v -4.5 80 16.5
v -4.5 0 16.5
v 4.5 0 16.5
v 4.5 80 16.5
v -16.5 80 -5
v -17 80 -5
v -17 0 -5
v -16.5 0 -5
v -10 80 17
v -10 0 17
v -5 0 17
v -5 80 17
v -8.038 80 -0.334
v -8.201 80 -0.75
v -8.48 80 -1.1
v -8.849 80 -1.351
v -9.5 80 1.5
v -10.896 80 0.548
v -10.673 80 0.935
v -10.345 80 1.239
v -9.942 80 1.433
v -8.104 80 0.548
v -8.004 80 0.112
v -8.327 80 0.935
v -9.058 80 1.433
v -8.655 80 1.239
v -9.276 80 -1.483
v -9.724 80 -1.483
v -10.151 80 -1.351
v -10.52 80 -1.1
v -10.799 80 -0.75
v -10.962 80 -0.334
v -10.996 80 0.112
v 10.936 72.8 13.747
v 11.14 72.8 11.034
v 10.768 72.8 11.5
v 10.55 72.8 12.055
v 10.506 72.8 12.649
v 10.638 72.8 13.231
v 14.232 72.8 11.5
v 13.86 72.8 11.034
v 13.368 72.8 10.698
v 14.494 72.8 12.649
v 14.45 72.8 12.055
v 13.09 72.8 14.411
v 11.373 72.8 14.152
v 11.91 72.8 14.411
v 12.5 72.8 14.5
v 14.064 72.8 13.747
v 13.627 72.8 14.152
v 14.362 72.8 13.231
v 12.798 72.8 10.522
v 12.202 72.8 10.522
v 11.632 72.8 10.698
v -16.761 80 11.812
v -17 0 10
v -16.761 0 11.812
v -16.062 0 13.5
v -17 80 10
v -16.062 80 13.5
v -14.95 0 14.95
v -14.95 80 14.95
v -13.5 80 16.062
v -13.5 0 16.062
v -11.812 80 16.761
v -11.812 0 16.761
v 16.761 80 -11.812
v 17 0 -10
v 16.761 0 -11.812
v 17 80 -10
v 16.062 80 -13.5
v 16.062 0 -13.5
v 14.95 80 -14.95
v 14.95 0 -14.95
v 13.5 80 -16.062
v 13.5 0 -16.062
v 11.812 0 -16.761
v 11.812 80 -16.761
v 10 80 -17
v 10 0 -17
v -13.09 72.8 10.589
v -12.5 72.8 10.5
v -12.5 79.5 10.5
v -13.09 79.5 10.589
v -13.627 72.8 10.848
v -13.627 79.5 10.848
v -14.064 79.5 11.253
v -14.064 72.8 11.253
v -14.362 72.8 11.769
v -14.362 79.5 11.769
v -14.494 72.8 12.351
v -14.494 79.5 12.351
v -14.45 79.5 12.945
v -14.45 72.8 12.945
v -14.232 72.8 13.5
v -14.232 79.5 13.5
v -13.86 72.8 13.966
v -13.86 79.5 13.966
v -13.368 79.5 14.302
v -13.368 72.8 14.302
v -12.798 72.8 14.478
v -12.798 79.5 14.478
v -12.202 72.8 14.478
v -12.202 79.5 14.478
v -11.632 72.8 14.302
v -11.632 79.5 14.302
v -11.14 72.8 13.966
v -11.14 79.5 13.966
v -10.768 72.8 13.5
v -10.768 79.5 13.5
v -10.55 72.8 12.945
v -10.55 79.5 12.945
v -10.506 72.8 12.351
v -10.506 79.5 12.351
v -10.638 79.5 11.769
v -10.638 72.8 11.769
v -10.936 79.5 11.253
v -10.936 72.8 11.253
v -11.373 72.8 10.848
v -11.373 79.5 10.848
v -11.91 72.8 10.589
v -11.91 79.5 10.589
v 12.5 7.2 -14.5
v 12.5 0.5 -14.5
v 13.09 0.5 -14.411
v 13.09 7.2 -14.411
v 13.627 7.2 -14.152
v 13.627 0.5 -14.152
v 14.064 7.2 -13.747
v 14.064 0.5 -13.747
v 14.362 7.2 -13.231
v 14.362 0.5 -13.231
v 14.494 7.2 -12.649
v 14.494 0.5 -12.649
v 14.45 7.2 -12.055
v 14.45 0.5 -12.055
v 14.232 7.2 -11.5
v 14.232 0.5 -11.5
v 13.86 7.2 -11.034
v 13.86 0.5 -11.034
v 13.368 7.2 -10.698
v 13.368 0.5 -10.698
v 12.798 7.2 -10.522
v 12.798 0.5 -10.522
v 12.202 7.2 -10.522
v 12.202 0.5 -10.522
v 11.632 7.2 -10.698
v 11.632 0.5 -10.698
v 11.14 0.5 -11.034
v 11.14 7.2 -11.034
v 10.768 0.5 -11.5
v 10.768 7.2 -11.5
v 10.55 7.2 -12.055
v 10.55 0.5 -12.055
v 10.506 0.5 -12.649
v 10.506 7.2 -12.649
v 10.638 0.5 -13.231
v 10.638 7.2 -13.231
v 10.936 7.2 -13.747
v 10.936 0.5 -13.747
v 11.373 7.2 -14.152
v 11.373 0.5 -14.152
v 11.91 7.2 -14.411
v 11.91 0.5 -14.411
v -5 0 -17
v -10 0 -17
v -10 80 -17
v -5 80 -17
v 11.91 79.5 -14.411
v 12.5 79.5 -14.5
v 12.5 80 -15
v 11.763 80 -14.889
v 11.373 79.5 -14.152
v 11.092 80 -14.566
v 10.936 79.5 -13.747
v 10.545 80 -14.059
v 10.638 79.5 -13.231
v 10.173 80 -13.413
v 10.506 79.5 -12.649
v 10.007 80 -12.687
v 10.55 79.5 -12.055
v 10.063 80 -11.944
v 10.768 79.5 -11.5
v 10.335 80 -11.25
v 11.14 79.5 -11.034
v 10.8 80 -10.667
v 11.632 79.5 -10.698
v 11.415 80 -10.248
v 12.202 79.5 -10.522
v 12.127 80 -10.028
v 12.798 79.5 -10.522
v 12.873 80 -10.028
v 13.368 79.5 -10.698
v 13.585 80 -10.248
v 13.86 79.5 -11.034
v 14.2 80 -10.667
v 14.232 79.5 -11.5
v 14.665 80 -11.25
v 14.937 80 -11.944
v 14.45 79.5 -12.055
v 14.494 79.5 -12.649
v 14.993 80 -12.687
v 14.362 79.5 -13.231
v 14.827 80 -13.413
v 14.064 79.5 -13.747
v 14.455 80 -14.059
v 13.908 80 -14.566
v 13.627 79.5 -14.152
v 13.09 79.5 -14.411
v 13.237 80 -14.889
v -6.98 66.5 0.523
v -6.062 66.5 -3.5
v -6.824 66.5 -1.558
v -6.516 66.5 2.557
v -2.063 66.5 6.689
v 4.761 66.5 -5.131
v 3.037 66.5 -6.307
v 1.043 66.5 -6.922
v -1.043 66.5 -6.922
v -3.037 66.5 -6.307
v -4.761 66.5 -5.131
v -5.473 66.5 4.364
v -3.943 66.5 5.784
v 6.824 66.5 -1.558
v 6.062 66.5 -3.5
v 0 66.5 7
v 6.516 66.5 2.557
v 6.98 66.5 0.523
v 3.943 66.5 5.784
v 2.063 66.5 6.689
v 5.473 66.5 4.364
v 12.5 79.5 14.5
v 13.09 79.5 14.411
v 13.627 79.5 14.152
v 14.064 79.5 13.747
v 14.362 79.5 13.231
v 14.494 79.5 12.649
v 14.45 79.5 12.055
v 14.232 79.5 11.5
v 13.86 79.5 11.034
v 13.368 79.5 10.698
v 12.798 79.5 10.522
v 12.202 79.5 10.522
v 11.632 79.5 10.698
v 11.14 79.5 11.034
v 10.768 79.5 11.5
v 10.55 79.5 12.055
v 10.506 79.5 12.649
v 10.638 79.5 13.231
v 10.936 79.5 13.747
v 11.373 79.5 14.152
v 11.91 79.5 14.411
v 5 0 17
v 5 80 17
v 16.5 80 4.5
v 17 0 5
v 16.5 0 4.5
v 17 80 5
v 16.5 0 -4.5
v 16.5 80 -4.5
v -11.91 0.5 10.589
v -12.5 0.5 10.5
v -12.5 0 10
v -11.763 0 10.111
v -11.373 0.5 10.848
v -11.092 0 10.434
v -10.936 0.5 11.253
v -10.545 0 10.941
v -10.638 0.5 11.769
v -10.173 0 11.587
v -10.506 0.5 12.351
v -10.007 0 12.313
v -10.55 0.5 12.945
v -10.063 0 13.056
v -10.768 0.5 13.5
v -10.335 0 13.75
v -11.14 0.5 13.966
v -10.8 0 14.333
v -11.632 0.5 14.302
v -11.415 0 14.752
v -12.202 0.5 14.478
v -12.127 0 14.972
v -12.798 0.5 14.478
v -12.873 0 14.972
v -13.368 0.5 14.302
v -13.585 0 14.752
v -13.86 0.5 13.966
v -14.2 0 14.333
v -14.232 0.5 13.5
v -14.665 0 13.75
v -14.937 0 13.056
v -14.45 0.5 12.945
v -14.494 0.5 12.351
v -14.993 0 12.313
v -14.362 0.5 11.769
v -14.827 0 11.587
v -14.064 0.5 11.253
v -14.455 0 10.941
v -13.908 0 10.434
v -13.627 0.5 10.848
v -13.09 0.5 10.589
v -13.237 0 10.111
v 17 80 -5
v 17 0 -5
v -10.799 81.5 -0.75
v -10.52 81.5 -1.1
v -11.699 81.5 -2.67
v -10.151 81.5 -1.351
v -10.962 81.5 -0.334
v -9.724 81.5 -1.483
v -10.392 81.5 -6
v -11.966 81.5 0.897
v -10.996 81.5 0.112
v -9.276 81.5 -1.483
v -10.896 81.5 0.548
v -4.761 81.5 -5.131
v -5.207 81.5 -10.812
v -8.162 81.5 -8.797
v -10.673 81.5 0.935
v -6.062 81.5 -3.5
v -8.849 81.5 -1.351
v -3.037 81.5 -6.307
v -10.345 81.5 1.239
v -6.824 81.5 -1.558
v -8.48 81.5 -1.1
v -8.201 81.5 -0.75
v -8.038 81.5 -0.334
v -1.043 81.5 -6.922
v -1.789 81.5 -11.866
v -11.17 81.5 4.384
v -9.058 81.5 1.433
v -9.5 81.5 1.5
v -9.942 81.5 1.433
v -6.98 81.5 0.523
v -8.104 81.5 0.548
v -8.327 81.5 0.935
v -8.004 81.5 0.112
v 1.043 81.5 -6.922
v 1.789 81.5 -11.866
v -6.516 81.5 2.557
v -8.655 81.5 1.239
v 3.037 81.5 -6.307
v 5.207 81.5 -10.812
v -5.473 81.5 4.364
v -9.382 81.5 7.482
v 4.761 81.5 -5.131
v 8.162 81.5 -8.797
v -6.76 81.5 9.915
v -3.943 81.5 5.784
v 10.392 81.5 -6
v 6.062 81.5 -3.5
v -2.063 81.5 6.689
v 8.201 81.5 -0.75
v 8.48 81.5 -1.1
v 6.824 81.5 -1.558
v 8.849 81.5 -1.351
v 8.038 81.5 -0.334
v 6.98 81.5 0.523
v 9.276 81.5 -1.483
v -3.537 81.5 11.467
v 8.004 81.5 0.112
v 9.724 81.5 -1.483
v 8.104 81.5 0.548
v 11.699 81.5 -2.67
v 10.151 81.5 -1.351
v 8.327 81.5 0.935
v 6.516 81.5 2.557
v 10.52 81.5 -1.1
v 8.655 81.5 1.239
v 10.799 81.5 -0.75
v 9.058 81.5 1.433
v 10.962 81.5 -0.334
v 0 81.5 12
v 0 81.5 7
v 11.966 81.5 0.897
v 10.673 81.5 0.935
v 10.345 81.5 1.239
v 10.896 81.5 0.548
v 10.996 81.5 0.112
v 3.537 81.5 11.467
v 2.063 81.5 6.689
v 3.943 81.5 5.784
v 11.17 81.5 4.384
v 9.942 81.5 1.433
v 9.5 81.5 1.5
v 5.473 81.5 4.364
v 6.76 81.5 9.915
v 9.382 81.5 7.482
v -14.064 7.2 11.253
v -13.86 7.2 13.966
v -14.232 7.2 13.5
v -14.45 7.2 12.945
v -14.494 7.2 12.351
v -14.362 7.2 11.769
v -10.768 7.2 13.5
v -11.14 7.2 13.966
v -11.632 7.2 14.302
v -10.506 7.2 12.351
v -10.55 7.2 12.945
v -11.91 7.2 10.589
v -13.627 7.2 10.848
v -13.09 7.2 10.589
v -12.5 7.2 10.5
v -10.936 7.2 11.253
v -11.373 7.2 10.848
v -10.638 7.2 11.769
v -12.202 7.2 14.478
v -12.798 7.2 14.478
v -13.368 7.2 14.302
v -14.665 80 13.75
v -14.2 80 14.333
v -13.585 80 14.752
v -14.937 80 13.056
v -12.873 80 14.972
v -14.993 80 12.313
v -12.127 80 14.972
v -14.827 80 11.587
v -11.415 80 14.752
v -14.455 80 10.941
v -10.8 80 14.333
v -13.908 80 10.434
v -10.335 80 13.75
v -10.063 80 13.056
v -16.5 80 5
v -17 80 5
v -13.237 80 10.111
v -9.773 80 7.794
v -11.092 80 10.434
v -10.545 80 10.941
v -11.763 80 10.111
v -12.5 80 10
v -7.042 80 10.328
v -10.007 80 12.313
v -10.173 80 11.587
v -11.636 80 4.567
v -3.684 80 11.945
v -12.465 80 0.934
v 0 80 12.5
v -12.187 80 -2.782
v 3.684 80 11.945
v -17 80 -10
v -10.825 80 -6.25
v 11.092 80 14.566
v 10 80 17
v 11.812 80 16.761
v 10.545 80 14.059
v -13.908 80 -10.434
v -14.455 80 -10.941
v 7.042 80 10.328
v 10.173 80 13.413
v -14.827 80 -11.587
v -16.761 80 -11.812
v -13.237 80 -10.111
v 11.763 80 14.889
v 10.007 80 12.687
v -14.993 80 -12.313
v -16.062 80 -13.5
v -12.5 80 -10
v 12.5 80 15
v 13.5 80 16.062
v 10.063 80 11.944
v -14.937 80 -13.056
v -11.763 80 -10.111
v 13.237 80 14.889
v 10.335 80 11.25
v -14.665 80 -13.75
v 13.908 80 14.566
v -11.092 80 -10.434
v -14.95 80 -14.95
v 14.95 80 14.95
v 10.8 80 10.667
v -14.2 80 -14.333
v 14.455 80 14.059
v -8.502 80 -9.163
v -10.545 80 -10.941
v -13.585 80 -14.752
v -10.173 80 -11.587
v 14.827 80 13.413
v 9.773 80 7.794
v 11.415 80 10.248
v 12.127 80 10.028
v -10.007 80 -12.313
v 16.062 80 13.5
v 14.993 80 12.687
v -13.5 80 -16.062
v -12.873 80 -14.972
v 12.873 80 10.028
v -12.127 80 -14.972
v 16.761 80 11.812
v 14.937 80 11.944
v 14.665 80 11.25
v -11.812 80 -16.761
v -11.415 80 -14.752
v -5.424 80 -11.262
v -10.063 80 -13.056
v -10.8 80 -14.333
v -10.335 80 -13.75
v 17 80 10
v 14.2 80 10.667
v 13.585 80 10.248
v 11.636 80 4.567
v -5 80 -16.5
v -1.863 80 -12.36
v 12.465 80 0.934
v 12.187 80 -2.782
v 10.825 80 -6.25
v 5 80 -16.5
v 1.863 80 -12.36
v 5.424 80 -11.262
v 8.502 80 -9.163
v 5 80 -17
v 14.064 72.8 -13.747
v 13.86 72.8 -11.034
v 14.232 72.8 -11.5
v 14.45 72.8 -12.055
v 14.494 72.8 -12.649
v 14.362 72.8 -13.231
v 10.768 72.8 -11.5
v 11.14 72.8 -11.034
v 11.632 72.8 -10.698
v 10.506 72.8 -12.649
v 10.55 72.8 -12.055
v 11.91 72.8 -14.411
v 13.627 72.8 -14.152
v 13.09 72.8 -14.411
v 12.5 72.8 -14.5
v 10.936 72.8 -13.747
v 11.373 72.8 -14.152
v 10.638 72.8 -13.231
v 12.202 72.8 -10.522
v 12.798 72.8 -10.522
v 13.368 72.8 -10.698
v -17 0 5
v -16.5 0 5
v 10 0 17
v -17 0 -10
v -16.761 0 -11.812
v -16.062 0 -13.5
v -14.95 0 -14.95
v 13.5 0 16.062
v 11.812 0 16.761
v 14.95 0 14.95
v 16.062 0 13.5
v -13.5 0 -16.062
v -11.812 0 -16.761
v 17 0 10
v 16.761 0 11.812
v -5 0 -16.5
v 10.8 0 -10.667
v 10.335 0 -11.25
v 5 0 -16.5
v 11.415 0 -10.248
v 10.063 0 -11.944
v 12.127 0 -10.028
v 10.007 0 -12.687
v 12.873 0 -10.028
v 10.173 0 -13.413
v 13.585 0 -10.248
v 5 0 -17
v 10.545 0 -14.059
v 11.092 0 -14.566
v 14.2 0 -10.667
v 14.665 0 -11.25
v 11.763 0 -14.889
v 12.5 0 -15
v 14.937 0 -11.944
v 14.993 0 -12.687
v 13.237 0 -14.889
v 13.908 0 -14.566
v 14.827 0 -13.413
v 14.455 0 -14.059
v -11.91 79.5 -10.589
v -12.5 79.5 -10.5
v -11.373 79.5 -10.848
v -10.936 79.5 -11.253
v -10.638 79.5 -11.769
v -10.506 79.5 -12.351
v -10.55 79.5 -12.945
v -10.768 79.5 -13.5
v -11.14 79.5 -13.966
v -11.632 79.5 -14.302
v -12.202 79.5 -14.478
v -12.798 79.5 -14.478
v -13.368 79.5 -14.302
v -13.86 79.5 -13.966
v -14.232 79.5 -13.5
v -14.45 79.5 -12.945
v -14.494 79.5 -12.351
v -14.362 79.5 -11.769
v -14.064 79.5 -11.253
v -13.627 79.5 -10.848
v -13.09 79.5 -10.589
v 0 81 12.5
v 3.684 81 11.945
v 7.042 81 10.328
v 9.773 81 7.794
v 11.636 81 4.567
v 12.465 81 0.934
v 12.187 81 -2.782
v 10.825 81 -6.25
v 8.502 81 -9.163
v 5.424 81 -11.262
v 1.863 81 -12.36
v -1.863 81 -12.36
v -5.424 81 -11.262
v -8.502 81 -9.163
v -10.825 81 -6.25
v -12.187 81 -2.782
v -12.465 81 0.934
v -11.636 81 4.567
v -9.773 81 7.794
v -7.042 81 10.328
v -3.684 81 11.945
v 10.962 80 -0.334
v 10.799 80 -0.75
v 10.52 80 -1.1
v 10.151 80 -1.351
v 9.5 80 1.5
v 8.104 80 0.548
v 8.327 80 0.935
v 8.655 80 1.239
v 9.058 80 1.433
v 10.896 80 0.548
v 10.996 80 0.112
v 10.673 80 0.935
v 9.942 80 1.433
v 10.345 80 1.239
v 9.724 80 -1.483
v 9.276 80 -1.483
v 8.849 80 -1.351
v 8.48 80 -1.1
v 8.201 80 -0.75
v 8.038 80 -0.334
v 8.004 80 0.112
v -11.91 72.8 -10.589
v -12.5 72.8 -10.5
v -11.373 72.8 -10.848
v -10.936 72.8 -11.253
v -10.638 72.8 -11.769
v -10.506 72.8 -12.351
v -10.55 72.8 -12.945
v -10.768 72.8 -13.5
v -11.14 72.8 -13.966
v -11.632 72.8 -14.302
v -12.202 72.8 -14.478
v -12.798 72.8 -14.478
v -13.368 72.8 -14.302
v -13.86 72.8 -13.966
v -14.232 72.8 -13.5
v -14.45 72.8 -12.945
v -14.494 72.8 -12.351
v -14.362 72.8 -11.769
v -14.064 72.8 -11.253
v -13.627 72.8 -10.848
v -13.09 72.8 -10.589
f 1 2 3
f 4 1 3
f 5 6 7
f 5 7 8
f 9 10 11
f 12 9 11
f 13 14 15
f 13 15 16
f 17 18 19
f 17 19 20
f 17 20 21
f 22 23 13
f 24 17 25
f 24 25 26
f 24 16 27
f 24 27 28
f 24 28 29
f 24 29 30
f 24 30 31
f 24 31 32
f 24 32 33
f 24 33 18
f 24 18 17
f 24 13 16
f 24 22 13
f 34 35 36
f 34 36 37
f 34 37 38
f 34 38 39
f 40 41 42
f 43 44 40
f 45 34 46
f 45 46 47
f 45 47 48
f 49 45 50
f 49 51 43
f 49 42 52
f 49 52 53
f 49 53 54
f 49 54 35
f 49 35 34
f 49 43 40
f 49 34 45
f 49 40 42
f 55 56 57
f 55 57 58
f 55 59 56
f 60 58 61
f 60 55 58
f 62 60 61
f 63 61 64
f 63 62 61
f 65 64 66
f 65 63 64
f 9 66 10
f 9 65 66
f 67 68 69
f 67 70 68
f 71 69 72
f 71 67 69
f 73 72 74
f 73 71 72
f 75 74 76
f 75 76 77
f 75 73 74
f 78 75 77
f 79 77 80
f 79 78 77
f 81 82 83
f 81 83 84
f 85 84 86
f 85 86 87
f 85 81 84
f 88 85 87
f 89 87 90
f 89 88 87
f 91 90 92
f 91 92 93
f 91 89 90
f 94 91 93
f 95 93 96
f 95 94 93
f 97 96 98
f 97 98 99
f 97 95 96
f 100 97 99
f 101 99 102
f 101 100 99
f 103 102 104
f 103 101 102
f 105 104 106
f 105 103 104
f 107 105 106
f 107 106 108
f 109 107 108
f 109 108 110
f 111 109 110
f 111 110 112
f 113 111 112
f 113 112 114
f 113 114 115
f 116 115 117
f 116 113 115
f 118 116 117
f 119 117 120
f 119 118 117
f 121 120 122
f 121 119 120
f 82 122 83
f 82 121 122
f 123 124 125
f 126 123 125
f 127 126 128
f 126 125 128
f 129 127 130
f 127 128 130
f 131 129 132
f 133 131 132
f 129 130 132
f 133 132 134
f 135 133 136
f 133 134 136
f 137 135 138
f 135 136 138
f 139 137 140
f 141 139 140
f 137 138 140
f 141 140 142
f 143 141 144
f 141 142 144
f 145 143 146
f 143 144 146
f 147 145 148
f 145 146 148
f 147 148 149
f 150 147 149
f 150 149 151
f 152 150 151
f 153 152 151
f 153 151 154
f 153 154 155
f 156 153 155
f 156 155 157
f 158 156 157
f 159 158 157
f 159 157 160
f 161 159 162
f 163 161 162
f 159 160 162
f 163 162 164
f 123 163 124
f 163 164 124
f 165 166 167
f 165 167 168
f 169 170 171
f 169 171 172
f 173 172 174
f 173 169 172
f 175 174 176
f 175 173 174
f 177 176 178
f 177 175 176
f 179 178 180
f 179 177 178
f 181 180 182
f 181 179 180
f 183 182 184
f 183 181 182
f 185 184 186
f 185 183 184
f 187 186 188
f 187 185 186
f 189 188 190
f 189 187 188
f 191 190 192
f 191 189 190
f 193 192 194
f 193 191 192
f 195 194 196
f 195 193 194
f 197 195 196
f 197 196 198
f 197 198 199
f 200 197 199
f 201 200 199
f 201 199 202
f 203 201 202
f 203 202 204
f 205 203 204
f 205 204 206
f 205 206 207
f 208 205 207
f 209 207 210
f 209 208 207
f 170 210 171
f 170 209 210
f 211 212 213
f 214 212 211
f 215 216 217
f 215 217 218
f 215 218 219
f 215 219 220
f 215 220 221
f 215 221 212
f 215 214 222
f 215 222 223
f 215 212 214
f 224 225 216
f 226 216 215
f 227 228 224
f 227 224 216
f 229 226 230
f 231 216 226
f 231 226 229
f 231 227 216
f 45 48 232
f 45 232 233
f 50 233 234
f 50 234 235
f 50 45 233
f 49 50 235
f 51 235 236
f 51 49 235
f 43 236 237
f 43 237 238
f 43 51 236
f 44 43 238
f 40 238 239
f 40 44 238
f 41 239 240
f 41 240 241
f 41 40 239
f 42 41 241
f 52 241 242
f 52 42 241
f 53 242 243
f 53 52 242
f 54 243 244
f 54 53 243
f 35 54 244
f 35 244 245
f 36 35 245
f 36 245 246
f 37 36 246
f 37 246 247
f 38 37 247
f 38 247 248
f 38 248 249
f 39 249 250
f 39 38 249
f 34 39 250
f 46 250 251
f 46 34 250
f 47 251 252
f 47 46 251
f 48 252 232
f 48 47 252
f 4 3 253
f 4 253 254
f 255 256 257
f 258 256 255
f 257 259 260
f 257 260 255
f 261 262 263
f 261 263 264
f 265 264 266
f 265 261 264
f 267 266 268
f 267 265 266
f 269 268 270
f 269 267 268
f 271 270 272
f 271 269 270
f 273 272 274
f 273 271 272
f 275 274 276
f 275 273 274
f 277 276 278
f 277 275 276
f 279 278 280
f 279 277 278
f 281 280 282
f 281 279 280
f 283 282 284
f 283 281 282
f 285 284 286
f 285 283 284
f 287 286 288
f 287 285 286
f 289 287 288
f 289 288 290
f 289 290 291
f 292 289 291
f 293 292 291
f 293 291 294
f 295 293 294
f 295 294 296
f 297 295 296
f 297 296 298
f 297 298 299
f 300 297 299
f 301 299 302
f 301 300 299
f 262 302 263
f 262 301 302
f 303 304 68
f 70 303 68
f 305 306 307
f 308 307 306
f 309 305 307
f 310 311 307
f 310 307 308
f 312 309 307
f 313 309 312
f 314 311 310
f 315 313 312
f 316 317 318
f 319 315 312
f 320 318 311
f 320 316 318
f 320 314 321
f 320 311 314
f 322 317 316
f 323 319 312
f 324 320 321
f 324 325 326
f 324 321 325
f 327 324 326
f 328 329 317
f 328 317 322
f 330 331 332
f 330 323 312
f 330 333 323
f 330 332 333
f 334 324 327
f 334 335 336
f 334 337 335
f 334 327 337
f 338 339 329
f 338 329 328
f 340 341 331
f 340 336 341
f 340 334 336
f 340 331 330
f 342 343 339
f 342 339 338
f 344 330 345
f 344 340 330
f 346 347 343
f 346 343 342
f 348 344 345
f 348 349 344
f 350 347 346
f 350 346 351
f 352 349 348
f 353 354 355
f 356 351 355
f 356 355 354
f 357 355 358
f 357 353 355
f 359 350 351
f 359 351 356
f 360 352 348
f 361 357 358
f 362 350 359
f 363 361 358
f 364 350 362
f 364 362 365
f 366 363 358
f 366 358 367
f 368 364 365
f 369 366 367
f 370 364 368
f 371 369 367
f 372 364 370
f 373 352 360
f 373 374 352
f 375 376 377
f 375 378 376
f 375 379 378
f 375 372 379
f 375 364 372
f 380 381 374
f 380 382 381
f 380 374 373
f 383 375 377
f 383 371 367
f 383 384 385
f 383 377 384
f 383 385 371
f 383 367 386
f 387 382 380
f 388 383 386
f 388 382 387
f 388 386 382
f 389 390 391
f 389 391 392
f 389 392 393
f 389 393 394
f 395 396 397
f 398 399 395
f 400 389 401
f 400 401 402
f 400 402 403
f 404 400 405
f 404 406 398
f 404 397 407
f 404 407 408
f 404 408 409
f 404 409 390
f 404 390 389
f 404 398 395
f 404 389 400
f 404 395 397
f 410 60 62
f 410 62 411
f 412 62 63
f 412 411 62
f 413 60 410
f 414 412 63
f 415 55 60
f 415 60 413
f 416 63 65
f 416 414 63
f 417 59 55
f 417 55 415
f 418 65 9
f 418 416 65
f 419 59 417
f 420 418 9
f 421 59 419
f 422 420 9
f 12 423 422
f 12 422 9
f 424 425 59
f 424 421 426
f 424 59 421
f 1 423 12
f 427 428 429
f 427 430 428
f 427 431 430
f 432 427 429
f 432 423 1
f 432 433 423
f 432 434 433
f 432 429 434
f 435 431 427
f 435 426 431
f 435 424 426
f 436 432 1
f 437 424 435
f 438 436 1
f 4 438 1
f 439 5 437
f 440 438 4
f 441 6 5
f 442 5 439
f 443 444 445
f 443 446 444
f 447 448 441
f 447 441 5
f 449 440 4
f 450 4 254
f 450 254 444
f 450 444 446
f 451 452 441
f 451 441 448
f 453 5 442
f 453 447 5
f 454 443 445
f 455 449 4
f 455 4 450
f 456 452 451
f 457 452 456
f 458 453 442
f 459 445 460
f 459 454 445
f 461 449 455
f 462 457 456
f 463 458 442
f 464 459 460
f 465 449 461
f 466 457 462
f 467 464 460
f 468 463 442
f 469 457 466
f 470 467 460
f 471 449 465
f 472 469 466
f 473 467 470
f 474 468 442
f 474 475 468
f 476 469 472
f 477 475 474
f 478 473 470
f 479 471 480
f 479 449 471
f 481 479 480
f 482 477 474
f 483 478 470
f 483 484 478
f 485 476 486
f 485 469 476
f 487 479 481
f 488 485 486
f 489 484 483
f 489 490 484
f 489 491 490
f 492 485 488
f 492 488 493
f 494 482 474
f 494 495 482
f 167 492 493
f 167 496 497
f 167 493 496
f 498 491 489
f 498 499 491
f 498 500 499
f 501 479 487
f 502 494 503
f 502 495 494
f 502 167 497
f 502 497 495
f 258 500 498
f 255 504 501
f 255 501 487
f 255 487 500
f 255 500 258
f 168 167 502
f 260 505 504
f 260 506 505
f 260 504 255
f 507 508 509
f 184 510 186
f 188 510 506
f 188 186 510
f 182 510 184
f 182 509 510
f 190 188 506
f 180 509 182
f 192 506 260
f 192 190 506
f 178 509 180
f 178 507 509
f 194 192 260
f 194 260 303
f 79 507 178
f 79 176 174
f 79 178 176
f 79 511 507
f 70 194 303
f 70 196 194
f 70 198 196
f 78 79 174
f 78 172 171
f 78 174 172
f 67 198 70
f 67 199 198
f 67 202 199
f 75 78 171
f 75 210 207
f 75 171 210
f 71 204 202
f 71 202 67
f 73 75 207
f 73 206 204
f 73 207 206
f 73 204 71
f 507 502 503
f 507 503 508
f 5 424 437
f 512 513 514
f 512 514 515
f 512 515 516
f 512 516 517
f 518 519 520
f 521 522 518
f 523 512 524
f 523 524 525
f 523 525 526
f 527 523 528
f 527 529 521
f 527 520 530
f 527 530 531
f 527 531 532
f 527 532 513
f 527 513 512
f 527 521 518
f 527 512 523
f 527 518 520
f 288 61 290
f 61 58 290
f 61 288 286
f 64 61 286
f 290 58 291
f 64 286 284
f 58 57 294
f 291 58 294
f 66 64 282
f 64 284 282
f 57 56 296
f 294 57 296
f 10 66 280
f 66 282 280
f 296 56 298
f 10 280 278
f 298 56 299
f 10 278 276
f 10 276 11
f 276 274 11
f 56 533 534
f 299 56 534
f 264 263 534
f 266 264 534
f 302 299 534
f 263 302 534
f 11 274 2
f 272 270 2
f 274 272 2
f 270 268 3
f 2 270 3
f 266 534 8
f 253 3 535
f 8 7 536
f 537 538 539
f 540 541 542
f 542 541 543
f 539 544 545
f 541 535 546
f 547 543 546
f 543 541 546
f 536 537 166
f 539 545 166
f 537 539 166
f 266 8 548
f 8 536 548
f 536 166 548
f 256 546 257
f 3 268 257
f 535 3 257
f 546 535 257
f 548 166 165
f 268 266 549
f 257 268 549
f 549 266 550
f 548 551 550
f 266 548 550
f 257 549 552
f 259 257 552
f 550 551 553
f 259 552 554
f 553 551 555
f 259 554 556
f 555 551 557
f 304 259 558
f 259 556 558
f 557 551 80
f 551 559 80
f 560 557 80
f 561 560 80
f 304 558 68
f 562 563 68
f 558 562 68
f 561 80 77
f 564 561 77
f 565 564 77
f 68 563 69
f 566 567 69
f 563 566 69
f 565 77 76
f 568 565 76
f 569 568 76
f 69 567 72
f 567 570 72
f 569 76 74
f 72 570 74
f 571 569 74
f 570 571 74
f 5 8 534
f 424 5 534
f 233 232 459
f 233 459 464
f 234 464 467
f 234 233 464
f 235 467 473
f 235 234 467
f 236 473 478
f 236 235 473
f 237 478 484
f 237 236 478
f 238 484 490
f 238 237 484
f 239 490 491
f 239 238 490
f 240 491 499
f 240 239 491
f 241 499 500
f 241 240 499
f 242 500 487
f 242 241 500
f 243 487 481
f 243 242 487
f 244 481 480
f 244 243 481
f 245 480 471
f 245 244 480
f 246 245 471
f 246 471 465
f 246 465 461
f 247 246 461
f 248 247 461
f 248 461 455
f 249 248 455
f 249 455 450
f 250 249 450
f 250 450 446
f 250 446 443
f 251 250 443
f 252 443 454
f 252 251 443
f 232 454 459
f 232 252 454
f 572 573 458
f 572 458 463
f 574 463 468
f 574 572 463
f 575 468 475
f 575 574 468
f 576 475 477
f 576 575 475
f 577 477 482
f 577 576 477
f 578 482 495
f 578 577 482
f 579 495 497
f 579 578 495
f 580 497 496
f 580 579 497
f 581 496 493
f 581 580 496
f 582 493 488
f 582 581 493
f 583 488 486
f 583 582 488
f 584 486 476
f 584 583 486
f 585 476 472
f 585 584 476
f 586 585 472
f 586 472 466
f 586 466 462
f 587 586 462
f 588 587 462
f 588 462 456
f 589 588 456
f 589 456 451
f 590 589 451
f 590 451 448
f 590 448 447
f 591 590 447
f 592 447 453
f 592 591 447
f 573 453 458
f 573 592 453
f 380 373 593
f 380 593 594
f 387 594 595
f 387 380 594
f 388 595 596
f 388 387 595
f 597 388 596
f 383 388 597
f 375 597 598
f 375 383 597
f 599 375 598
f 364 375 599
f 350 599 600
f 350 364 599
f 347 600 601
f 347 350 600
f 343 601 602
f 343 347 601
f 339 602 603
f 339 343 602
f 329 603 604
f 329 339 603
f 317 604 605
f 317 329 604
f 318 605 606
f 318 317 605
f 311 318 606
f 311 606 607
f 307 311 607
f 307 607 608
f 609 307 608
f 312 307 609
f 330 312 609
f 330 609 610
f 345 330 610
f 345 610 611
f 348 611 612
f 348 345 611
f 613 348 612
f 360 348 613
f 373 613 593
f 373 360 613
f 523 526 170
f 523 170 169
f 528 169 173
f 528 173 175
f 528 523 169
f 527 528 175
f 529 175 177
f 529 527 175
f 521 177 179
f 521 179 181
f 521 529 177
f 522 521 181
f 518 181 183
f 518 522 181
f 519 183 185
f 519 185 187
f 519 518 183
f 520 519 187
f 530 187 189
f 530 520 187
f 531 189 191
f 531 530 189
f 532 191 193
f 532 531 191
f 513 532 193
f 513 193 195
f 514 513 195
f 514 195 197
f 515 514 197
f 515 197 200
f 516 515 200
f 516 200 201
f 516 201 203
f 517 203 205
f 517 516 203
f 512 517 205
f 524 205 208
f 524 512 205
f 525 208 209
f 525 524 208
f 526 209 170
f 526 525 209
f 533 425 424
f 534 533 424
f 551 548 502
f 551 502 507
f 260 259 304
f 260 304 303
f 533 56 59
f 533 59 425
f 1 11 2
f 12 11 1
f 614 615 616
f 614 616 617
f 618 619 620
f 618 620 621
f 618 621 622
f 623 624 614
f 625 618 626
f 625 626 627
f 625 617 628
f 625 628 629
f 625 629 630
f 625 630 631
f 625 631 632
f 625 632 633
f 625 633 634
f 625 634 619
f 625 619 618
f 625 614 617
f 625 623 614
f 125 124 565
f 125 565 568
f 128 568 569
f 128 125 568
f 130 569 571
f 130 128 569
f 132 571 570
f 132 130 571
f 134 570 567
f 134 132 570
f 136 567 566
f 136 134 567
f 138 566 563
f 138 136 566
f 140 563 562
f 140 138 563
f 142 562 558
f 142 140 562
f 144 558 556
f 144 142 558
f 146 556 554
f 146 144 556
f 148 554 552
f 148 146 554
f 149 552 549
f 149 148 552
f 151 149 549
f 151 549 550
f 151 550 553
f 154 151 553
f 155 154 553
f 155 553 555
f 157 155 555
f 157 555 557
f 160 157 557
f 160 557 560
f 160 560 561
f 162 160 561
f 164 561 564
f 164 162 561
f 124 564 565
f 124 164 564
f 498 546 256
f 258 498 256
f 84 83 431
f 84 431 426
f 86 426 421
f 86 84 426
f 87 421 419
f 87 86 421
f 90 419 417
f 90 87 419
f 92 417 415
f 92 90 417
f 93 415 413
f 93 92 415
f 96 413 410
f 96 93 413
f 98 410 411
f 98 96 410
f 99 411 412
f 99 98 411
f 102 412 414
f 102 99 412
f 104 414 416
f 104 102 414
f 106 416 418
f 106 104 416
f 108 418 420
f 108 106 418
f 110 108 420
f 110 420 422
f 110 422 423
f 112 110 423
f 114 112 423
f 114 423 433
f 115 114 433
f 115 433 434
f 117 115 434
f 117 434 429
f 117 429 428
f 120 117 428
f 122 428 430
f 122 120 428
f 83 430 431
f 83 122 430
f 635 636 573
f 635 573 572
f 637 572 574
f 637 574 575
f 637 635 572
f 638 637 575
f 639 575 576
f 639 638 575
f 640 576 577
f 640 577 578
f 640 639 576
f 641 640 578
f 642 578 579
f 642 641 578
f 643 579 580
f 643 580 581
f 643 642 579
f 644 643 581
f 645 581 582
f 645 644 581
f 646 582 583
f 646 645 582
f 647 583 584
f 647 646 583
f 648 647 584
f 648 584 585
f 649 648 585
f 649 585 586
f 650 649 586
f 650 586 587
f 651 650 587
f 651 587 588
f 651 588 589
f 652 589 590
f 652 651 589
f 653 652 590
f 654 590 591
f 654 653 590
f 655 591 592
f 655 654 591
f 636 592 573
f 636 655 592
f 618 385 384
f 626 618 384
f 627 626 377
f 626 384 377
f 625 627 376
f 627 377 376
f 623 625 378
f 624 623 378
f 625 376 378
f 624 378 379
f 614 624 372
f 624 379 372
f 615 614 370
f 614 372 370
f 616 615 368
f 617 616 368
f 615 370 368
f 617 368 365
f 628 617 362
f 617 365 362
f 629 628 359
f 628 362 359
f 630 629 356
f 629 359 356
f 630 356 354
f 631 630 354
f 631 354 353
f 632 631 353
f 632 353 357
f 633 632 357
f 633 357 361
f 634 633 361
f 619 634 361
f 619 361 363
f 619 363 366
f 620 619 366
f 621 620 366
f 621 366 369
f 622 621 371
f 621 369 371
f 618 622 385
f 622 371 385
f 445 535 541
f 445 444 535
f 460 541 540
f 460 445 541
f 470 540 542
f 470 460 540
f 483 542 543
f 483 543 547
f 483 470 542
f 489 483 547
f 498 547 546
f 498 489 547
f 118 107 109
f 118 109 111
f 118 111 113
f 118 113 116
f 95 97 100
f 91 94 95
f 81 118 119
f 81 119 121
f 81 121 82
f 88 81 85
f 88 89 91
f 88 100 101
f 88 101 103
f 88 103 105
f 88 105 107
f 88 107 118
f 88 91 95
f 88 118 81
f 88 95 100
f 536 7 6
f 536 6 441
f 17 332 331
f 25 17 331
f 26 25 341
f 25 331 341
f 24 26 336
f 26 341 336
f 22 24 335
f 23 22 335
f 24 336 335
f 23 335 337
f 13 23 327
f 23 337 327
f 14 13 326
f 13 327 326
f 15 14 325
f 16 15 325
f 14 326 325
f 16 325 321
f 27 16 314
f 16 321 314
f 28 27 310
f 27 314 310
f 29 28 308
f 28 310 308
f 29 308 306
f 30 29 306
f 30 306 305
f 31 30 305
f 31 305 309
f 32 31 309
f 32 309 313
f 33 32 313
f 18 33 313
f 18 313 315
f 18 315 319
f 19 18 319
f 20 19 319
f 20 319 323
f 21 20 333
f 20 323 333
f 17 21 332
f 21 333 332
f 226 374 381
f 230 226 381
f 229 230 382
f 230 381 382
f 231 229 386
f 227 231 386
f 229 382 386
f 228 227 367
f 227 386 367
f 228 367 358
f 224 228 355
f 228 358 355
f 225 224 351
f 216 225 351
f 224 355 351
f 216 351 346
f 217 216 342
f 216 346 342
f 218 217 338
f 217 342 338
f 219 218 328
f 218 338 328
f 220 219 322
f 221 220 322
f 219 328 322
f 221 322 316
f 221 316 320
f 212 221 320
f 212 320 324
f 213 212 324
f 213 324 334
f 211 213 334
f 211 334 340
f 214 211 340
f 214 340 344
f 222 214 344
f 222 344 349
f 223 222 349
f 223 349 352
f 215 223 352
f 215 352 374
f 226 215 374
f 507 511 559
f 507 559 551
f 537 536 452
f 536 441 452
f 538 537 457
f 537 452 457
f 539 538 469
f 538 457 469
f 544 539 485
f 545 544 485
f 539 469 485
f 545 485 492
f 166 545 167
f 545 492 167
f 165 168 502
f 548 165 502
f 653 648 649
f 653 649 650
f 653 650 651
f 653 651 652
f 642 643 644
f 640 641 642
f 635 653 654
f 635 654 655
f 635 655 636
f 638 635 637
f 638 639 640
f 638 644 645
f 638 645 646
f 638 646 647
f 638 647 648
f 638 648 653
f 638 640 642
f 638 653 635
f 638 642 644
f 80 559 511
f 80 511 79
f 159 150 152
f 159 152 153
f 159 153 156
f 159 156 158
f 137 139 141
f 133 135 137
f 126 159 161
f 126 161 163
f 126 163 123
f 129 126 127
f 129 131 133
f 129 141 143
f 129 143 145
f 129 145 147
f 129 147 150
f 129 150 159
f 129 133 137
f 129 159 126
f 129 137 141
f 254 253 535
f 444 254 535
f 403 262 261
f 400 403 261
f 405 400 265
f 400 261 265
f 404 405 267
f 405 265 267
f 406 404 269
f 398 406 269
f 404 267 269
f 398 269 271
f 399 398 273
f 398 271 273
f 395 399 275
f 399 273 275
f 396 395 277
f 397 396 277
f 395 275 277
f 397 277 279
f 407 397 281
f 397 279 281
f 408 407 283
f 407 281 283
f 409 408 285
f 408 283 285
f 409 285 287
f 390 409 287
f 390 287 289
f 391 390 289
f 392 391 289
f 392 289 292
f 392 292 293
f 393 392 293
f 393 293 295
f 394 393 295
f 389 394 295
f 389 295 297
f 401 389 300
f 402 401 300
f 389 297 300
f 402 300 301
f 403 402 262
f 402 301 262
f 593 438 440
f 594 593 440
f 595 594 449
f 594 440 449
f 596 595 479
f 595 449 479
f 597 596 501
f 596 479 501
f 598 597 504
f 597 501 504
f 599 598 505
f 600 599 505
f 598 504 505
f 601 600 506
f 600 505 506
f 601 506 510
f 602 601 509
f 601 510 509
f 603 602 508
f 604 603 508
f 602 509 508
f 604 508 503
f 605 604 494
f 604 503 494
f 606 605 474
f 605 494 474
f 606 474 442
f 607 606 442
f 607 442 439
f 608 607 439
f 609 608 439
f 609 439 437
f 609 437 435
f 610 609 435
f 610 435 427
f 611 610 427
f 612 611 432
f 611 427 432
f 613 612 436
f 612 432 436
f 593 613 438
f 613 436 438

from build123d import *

# Parameters (mm, degrees)
SKETCH_1_W           = 34
SKETCH_1_H           = 34
EXTRUDE_1_DEPTH      = 80
FILLET_1_R           = 7
CUT_EXTRUDE_8_REACH  = 85.534
SKETCH_13_W          = 10
SKETCH_13_H          = 0.5
SKETCH_13_W_2        = 0.5
SKETCH_13_H_2        = 10
CHAMFER_1_SIZE       = 0.5
SKETCH_18_R          = 2
CUT_EXTRUDE_9_DEPTH  = 7.2
CHAMFER_2_SIZE       = 0.5
CUT_EXTRUDE_START    = -7.2
SKETCH_19_R          = 2
CUT_EXTRUDE_10_DEPTH = 7.2
CHAMFER_3_SIZE       = 0.5
SKETCH_20_R          = 12.5
EXTRUDE_2_DEPTH      = 1.5
CHAMFER_4_SIZE       = 0.5
SKETCH_21_R          = 7
SKETCH_21_R_2        = 1.5
CUT_EXTRUDE_11_DEPTH = 1.5
SKETCH_23_R          = 7
CUT_EXTRUDE_12_DEPTH = 13.5
CUT_EXTRUDE_START_2  = -80
SKETCH_10_W          = 10
SKETCH_10_H          = 0.5
CUT_EXTRUDE_4_DEPTH  = 80
SKETCH_12_W          = 0.5
SKETCH_12_H          = 10
CUT_EXTRUDE_5_DEPTH  = 80


with BuildPart() as part:
    # ｽｹｯﾁ1 → ﾎﾞｽ - 押し出し1 (new body)
    with BuildSketch(Plane(origin=(0, 0, 0), x_dir=(1, 0, 0), z_dir=(0, 1, 0))):
        Rectangle(SKETCH_1_W, SKETCH_1_H)
    extrude(amount=EXTRUDE_1_DEPTH)

    # ﾌｨﾚｯﾄ1
    fillet_1_edges = [part.edges().sort_by_distance(p)[0] for p in [
        (-17, 40, -17),
        (17, 40, -17),
        (17, 40, 17),
        (-17, 40, 17),
    ]]
    fillet(fillet_1_edges, radius=FILLET_1_R)

    # ｽｹｯﾁ13 → ｶｯﾄ - 押し出し8 (cut, up to next)
    with BuildSketch(Plane.XZ, mode=Mode.PRIVATE) as cut_extrude_8_sk1:
        with Locations((0, 16.75)):
            Rectangle(SKETCH_13_W, SKETCH_13_H)
    cut_extrude_8_tool1 = extrude(cut_extrude_8_sk1.sketch, amount=-CUT_EXTRUDE_8_REACH, mode=Mode.PRIVATE) & part.part
    # ｽｹｯﾁ13 → ｶｯﾄ - 押し出し8 (cut, up to next)
    with BuildSketch(Plane.XZ, mode=Mode.PRIVATE) as cut_extrude_8_sk2:
        with Locations((-16.75, 0)):
            Rectangle(SKETCH_13_W_2, SKETCH_13_H_2)
    cut_extrude_8_tool2 = extrude(cut_extrude_8_sk2.sketch, amount=-CUT_EXTRUDE_8_REACH, mode=Mode.PRIVATE) & part.part
    # ｽｹｯﾁ13 → ｶｯﾄ - 押し出し8 (cut, up to next)
    with BuildSketch(Plane.XZ, mode=Mode.PRIVATE) as cut_extrude_8_sk3:
        with Locations((0, -16.75)):
            Rectangle(SKETCH_13_W, SKETCH_13_H)
    cut_extrude_8_tool3 = extrude(cut_extrude_8_sk3.sketch, amount=-CUT_EXTRUDE_8_REACH, mode=Mode.PRIVATE) & part.part
    # ｽｹｯﾁ13 → ｶｯﾄ - 押し出し8 (cut, up to next)
    with BuildSketch(Plane.XZ, mode=Mode.PRIVATE) as cut_extrude_8_sk4:
        with Locations((16.75, 0)):
            Rectangle(SKETCH_13_W_2, SKETCH_13_H_2)
    cut_extrude_8_tool4 = extrude(cut_extrude_8_sk4.sketch, amount=-CUT_EXTRUDE_8_REACH, mode=Mode.PRIVATE) & part.part
    add(cut_extrude_8_tool1.solids().sort_by_distance((0, 0, 16.75))[0], mode=Mode.SUBTRACT)
    add(cut_extrude_8_tool2.solids().sort_by_distance((-16.75, 0, 0))[0], mode=Mode.SUBTRACT)
    add(cut_extrude_8_tool3.solids().sort_by_distance((0, 0, -16.75))[0], mode=Mode.SUBTRACT)
    add(cut_extrude_8_tool4.solids().sort_by_distance((16.75, 0, 0))[0], mode=Mode.SUBTRACT)

    # 面取り1
    chamfer_1_edges = [part.edges().sort_by_distance(p)[0] for p in [
        (-5, 40, 16.5),
        (5, 40, 16.5),
        (16.5, 40, 5),
        (16.5, 40, -5),
        (5, 40, -16.5),
        (-5, 40, -16.5),
        (-16.5, 40, -5),
        (-16.5, 40, 5),
    ]]
    chamfer(chamfer_1_edges, length=CHAMFER_1_SIZE - 0.0001)  # a hair under: the kernel refuses the full size

    # ｽｹｯﾁ18 → ｶｯﾄ - 押し出し9 (cut)
    with BuildSketch(Plane.XZ):
        with Locations(Location((12.5, -12.5, 0), (0, 0, 270))):
            Circle(SKETCH_18_R)
        with Locations(Location((-12.5, 12.5, 0), (0, 0, 270))):
            Circle(SKETCH_18_R)
    extrude(amount=-CUT_EXTRUDE_9_DEPTH, mode=Mode.SUBTRACT)

    # 面取り2
    chamfer_2_edges = [part.edges().sort_by_distance(p)[0] for p in [
        (12.5, 0, -10.5),
        (-12.5, 0, 14.5),
    ]]
    chamfer(chamfer_2_edges, length=CHAMFER_2_SIZE)

    # ｽｹｯﾁ19 → ｶｯﾄ - 押し出し10 (cut)
    with BuildSketch(Plane(origin=(0, 80, 0), x_dir=(1, 0, 0), z_dir=(0, 1, 0)).offset(CUT_EXTRUDE_START)):
        with Locations(Location((-12.5, -12.5, 0), (0, 0, 90))):
            Circle(SKETCH_19_R)
        with Locations(Location((-12.5, 12.5, 0), (0, 0, 270))):
            Circle(SKETCH_19_R)
        with Locations(Location((12.5, 12.5, 0), (0, 0, 90))):
            Circle(SKETCH_19_R)
        with Locations(Location((12.5, -12.5, 0), (0, 0, 270))):
            Circle(SKETCH_19_R)
    extrude(amount=CUT_EXTRUDE_10_DEPTH, mode=Mode.SUBTRACT)

    # 面取り3
    chamfer_3_edges = [part.edges().sort_by_distance(p)[0] for p in [
        (-12.5, 80, -14.5),
        (-12.5, 80, 14.5),
        (12.5, 80, -10.5),
        (12.5, 80, 10.5),
    ]]
    chamfer(chamfer_3_edges, length=CHAMFER_3_SIZE)

    # ｽｹｯﾁ20 → ﾎﾞｽ - 押し出し2 (add)
    with BuildSketch(Plane(origin=(0, 80, 0), x_dir=(1, 0, 0), z_dir=(0, 1, 0))):
        with Locations(Location((0, 0, 0), (0, 0, 270))):
            Circle(SKETCH_20_R)
    extrude(amount=EXTRUDE_2_DEPTH)

    # 面取り4
    chamfer_4_edges = [part.edges().sort_by_distance(p)[0] for p in [
        (0, 81.5, -12.5),
    ]]
    chamfer(chamfer_4_edges, length=CHAMFER_4_SIZE)

    # ｽｹｯﾁ21 → ｶｯﾄ - 押し出し11 (cut)
    with BuildSketch(Plane(origin=(0, 81.5, 0), x_dir=(1, 0, 0), z_dir=(0, 1, 0))):
        with Locations(Location((0, 0, 0), (0, 0, 270))):
            Circle(SKETCH_21_R)
        with Locations(Location((9.5, 0, 0), (0, 0, 270))):
            Circle(SKETCH_21_R_2)
        with Locations(Location((-9.5, 0, 0), (0, 0, 270))):
            Circle(SKETCH_21_R_2)
    extrude(amount=-CUT_EXTRUDE_11_DEPTH, mode=Mode.SUBTRACT)

    # ｽｹｯﾁ23 → ｶｯﾄ - 押し出し12 (cut)
    with BuildSketch(Plane(origin=(0, 80, 0), x_dir=(1, 0, 0), z_dir=(0, 1, 0))):
        with Locations(Location((0, 0, 0), (0, 0, 270))):
            Circle(SKETCH_23_R)
    extrude(amount=-CUT_EXTRUDE_12_DEPTH, mode=Mode.SUBTRACT)

    # ｽｹｯﾁ10 → ｶｯﾄ - 押し出し4 (cut)
    with BuildSketch(Plane.XZ.offset(CUT_EXTRUDE_START_2)):
        with Locations((0, -16.75)):
            Rectangle(SKETCH_10_W, SKETCH_10_H)
    extrude(amount=CUT_EXTRUDE_4_DEPTH, mode=Mode.SUBTRACT)

    # ｽｹｯﾁ12 → ｶｯﾄ - 押し出し5 (cut)
    with BuildSketch(Plane.XZ.offset(CUT_EXTRUDE_START_2)):
        with Locations((-16.75, 0)):
            Rectangle(SKETCH_12_W, SKETCH_12_H)
    extrude(amount=CUT_EXTRUDE_5_DEPTH, mode=Mode.SUBTRACT)


solid = part.part
